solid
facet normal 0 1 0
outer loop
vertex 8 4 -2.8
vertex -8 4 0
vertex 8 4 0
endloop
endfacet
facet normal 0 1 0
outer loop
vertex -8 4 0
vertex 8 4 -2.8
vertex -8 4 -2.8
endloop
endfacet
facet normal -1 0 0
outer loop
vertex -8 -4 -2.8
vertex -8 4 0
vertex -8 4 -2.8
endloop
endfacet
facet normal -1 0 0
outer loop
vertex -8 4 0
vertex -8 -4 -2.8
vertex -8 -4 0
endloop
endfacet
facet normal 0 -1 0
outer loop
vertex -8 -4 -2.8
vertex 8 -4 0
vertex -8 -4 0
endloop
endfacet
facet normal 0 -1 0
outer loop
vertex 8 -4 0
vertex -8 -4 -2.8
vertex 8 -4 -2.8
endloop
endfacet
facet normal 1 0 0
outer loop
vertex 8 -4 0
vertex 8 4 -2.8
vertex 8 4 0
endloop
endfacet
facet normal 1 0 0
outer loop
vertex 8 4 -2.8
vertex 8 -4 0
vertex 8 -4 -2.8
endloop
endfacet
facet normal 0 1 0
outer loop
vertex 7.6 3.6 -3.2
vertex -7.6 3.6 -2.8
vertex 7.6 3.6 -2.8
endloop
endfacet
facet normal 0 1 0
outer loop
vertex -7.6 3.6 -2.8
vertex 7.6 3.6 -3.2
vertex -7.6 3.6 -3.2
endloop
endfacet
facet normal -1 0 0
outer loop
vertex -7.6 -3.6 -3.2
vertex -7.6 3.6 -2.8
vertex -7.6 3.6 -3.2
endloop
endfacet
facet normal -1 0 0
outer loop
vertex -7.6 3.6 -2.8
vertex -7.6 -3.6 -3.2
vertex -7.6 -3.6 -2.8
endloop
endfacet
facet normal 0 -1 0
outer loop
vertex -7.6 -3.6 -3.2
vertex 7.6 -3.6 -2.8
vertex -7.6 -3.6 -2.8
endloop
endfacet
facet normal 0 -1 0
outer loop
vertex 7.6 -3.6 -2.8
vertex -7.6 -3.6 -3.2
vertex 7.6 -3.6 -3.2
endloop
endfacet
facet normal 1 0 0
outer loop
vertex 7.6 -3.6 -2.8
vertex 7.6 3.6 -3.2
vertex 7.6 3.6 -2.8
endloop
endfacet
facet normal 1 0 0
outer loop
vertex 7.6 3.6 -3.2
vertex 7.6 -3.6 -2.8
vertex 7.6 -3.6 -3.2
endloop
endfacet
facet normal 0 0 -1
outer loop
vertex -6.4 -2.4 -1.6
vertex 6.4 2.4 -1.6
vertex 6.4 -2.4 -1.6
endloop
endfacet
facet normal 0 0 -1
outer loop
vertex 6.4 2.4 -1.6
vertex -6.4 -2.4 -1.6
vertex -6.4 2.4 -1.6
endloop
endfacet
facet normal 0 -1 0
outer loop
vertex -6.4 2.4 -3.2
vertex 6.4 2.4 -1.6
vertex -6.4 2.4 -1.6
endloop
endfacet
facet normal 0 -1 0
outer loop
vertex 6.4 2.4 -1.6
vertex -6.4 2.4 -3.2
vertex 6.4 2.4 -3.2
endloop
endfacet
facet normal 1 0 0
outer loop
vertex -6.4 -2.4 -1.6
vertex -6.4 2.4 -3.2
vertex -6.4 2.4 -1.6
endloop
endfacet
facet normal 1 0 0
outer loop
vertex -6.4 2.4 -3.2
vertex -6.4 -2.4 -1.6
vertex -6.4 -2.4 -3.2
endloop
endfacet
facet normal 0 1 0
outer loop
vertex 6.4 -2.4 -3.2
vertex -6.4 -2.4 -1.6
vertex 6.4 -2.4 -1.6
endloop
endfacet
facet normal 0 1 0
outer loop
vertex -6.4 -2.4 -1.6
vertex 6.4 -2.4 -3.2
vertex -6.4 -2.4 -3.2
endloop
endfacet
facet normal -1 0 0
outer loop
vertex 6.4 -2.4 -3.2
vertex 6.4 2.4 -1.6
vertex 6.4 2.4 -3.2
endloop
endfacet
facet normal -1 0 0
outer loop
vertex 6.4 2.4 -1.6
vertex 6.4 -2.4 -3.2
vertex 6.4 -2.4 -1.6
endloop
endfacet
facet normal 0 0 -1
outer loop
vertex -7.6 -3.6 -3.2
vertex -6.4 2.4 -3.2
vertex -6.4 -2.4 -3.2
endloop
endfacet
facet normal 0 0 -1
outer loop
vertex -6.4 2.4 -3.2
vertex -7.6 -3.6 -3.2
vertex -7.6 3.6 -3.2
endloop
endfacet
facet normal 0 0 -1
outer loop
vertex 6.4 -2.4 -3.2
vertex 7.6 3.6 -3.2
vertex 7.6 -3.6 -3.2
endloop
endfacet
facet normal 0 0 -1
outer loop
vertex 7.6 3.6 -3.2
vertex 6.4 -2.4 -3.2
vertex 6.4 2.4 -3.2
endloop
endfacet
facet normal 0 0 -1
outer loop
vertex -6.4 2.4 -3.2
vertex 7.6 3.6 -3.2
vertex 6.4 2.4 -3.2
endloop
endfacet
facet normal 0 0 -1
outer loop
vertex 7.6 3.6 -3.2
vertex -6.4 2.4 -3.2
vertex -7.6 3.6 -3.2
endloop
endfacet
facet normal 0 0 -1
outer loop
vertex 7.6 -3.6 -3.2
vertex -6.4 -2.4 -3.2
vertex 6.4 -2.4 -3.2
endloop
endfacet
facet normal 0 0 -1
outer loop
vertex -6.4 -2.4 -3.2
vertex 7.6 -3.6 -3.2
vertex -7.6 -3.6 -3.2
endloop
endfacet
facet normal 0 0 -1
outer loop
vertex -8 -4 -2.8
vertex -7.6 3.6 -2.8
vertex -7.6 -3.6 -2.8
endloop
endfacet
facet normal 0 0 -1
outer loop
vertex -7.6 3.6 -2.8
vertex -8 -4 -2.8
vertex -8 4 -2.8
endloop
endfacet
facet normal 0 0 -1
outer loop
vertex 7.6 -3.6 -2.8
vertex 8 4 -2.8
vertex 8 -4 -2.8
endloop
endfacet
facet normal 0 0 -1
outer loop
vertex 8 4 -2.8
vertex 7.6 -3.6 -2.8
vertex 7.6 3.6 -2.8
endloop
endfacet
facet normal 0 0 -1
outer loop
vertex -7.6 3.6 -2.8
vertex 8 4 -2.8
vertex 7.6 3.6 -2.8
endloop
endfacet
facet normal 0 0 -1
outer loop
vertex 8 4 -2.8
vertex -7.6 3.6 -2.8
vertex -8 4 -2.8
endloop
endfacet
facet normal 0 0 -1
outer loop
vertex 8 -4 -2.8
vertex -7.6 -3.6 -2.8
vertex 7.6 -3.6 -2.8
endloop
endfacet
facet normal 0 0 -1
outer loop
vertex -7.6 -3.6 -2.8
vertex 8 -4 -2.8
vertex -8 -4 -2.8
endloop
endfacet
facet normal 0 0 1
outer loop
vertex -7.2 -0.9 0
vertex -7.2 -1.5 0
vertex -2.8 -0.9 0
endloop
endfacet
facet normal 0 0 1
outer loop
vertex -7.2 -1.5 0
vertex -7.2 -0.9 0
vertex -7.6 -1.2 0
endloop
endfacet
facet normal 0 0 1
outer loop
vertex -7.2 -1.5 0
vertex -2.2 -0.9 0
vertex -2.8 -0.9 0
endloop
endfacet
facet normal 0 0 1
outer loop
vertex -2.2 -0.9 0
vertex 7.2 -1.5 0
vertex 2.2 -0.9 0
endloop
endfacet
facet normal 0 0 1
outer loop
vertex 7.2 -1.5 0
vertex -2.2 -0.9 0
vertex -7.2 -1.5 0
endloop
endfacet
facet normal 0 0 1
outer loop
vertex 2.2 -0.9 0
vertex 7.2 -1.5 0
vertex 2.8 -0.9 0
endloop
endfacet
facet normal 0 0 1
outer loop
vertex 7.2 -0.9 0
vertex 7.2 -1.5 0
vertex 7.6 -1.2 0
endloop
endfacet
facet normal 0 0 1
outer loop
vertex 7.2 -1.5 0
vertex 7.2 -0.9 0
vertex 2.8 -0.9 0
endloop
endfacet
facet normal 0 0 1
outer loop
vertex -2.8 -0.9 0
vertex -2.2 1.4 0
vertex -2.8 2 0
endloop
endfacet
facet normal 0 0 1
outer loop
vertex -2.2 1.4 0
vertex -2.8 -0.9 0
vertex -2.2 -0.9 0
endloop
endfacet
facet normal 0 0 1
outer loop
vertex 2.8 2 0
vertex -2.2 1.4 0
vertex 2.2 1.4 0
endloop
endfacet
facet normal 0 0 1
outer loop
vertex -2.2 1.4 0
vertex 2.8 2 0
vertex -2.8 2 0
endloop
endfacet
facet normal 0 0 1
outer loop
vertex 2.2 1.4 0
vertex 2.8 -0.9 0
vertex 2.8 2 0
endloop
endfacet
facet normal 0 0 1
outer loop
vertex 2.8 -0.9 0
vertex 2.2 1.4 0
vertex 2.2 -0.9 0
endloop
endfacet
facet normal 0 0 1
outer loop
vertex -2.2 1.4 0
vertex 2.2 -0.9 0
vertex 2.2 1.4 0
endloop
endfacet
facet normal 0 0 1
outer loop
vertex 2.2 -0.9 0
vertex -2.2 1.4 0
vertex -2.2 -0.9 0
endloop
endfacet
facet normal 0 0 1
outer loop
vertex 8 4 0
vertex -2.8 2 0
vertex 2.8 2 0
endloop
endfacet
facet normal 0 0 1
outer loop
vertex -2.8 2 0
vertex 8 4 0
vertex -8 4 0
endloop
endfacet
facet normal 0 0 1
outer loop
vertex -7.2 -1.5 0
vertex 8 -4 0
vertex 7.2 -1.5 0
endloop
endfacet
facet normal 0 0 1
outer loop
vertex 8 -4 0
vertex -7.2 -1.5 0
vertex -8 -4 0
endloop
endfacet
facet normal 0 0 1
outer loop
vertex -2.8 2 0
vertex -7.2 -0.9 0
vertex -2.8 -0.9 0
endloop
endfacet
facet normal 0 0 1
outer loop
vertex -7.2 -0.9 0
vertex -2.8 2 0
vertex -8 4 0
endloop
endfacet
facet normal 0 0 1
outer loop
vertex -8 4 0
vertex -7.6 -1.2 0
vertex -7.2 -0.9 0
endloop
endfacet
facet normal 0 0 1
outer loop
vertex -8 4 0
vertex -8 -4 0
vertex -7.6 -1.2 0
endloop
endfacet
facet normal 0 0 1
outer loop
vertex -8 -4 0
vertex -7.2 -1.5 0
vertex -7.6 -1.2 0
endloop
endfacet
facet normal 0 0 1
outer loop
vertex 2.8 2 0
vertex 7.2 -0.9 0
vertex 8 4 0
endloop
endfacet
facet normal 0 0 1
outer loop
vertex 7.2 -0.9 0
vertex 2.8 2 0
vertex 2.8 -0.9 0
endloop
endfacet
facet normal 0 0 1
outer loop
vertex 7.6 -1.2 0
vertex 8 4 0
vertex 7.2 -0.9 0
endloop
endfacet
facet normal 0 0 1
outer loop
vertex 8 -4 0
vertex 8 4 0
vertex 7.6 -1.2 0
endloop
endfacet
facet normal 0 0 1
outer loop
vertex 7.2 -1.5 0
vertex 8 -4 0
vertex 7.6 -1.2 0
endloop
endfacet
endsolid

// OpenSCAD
// file: ../p/box5.scad
use <../lib.scad>
function ldraw_lib__box5() = [
// 0 Box with 5 Faces and All Edges
// 0 Name: box5.dat
// 0 Author: James Jessiman
// 0 !LDRAW_ORG Primitive UPDATE 2012-01
// 0 !LICENSE Licensed under CC BY 2.0 and CC BY 4.0 : see CAreadme.txt
// 
// 0 BFC CERTIFY CCW
  [0,"BFC","CERTIFY"],
  [0,"BFC","CCW"],
// 
// 0 !HISTORY 2002-04-03 [sbliss] Modified for BFC compliance
// 0 !HISTORY 2002-04-25 [PTadmin] Official Update 2002-02
// 0 !HISTORY 2007-06-24 [PTadmin] Header formatted for Contributor Agreement
// 0 !HISTORY 2008-07-01 [PTadmin] Official Update 2008-01
// 0 !HISTORY 2012-02-16 [Philo] Changed to CCW
// 0 !HISTORY 2012-03-30 [PTadmin] Official Update 2012-01
// 
// 
// 2 24 1 1 1 -1 1 1
  [2,24,1,1,1,-1,1,1],
// 2 24 -1 1 1 -1 1 -1
  [2,24,-1,1,1,-1,1,-1],
// 2 24 -1 1 -1 1 1 -1
  [2,24,-1,1,-1,1,1,-1],
// 2 24 1 1 -1 1 1 1
  [2,24,1,1,-1,1,1,1],
// 2 24 1 0 1 -1 0 1
  [2,24,1,0,1,-1,0,1],
// 2 24 -1 0 1 -1 0 -1
  [2,24,-1,0,1,-1,0,-1],
// 2 24 -1 0 -1 1 0 -1
  [2,24,-1,0,-1,1,0,-1],
// 2 24 1 0 -1 1 0 1
  [2,24,1,0,-1,1,0,1],
// 2 24 1 0 1 1 1 1
  [2,24,1,0,1,1,1,1],
// 2 24 -1 0 1 -1 1 1
  [2,24,-1,0,1,-1,1,1],
// 2 24 1 0 -1 1 1 -1
  [2,24,1,0,-1,1,1,-1],
// 2 24 -1 0 -1 -1 1 -1
  [2,24,-1,0,-1,-1,1,-1],
// 4 16 -1 1 1 1 1 1 1 1 -1 -1 1 -1
  [4,16,-1,1,1,1,1,1,1,1,-1,-1,1,-1],
// 4 16 -1 1 1 -1 0 1 1 0 1 1 1 1
  [4,16,-1,1,1,-1,0,1,1,0,1,1,1,1],
// 4 16 -1 1 -1 -1 0 -1 -1 0 1 -1 1 1
  [4,16,-1,1,-1,-1,0,-1,-1,0,1,-1,1,1],
// 4 16 1 1 -1 1 0 -1 -1 0 -1 -1 1 -1
  [4,16,1,1,-1,1,0,-1,-1,0,-1,-1,1,-1],
// 4 16 1 1 1 1 0 1 1 0 -1 1 1 -1
  [4,16,1,1,1,1,0,1,1,0,-1,1,1,-1],
];
makepoly(ldraw_lib__box5(), line=0.2);
// file: ../p/box4.scad
use <../lib.scad>
function ldraw_lib__box4() = [
// 0 Box with 4 Faces (2 Parallel Pairs) and All Edges
// 0 Name: box4.dat
// 0 Author: James Jessiman
// 0 !LDRAW_ORG Primitive UPDATE 2012-01
// 0 !LICENSE Licensed under CC BY 2.0 and CC BY 4.0 : see CAreadme.txt
// 
// 0 BFC CERTIFY CCW
  [0,"BFC","CERTIFY"],
  [0,"BFC","CCW"],
// 
// 0 !HISTORY 2002-04-03 [sbliss] Modified for BFC compliance
// 0 !HISTORY 2002-04-25 [PTadmin] Official Update 2002-02
// 0 !HISTORY 2007-06-24 [PTadmin] Header formatted for Contributor Agreement
// 0 !HISTORY 2008-07-01 [PTadmin] Official Update 2008-01
// 0 !HISTORY 2012-02-16 [Philo] Changed to CCW
// 0 !HISTORY 2012-03-30 [PTadmin] Official Update 2012-01
// 
// 
// 2 24 1 1 1 -1 1 1
  [2,24,1,1,1,-1,1,1],
// 2 24 -1 1 1 -1 1 -1
  [2,24,-1,1,1,-1,1,-1],
// 2 24 -1 1 -1 1 1 -1
  [2,24,-1,1,-1,1,1,-1],
// 2 24 1 1 -1 1 1 1
  [2,24,1,1,-1,1,1,1],
// 2 24 1 0 1 -1 0 1
  [2,24,1,0,1,-1,0,1],
// 2 24 -1 0 1 -1 0 -1
  [2,24,-1,0,1,-1,0,-1],
// 2 24 -1 0 -1 1 0 -1
  [2,24,-1,0,-1,1,0,-1],
// 2 24 1 0 -1 1 0 1
  [2,24,1,0,-1,1,0,1],
// 2 24 1 0 1 1 1 1
  [2,24,1,0,1,1,1,1],
// 2 24 -1 0 1 -1 1 1
  [2,24,-1,0,1,-1,1,1],
// 2 24 1 0 -1 1 1 -1
  [2,24,1,0,-1,1,1,-1],
// 2 24 -1 0 -1 -1 1 -1
  [2,24,-1,0,-1,-1,1,-1],
// 4 16 -1 1 1 -1 0 1 1 0 1 1 1 1
  [4,16,-1,1,1,-1,0,1,1,0,1,1,1,1],
// 4 16 -1 1 -1 -1 0 -1 -1 0 1 -1 1 1
  [4,16,-1,1,-1,-1,0,-1,-1,0,1,-1,1,1],
// 4 16 1 1 -1 1 0 -1 -1 0 -1 -1 1 -1
  [4,16,1,1,-1,1,0,-1,-1,0,-1,-1,1,-1],
// 4 16 1 1 1 1 0 1 1 0 -1 1 1 -1
  [4,16,1,1,1,1,0,1,1,0,-1,1,1,-1],
];
makepoly(ldraw_lib__box4(), line=0.2);
// file: s/3069bs01.scad
use <../../lib.scad>
use <../../p/box4.scad>
use <../../p/box5.scad>
function ldraw_lib__s__3069bs01() = [
// 0 ~Tile  1 x  2 with Groove without Top Face
// 0 Name: s\3069bs01.dat
// 0 Author: Santeri Piippo [arezey]
// 0 !LDRAW_ORG Subpart UPDATE 2010-02
// 0 !LICENSE Licensed under CC BY 2.0 and CC BY 4.0 : see CAreadme.txt
// 
// 0 BFC CERTIFY CCW
  [0,"BFC","CERTIFY"],
  [0,"BFC","CCW"],
// 
// 0 !HISTORY 2010-07-05 [PTadmin] Official Update 2010-02
// 
// 
// 1 16 0 0 0 20 0 0 0 7 0 0 0 10 box4.dat
  [1,16,0,0,0,20,0,0,0,7,0,0,0,10, ldraw_lib__box4()],
// 1 16 0 7 0 19 0 0 0 1 0 0 0 9 box4.dat
  [1,16,0,7,0,19,0,0,0,1,0,0,0,9, ldraw_lib__box4()],
// 0 BFC INVERTNEXT
  [0,"BFC","INVERTNEXT"],
// 1 16 0 8 0 16 0 0 0 -4 0 0 0 6 box5.dat
  [1,16,0,8,0,16,0,0,0,-4,0,0,0,6, ldraw_lib__box5()],
// 4 16 -19 8 9 -16 8 6 -16 8 -6 -19 8 -9
  [4,16,-19,8,9,-16,8,6,-16,8,-6,-19,8,-9],
// 4 16 19 8 -9 16 8 -6 16 8 6 19 8 9
  [4,16,19,8,-9,16,8,-6,16,8,6,19,8,9],
// 4 16 19 8 9 16 8 6 -16 8 6 -19 8 9
  [4,16,19,8,9,16,8,6,-16,8,6,-19,8,9],
// 4 16 -19 8 -9 -16 8 -6 16 8 -6 19 8 -9
  [4,16,-19,8,-9,-16,8,-6,16,8,-6,19,8,-9],
// 4 16 -20 7 10 -19 7 9 -19 7 -9 -20 7 -10
  [4,16,-20,7,10,-19,7,9,-19,7,-9,-20,7,-10],
// 4 16 20 7 -10 19 7 -9 19 7 9 20 7 10
  [4,16,20,7,-10,19,7,-9,19,7,9,20,7,10],
// 4 16 20 7 10 19 7 9 -19 7 9 -20 7 10
  [4,16,20,7,10,19,7,9,-19,7,9,-20,7,10],
// 4 16 -20 7 -10 -19 7 -9 19 7 -9 20 7 -10
  [4,16,-20,7,-10,-19,7,-9,19,7,-9,20,7,-10],
// 0 //
];
makepoly(ldraw_lib__s__3069bs01(), line=0.2);
// main file
use <../lib.scad>
use <s/3069bs01.scad>
function ldraw_lib__3069bpzd() = [
// 0 Tile  1 x  2 with Black Rectangle Outline and Line Pattern
// 0 Name: 3069bpzd.dat
// 0 Author: Vincent Messenet [Cheenzo]
// 0 !LDRAW_ORG Part UPDATE 2019-02
// 0 !LICENSE Licensed under CC BY 2.0 and CC BY 4.0 : see CAreadme.txt
// 
// 0 BFC CERTIFY CCW
  [0,"BFC","CERTIFY"],
  [0,"BFC","CCW"],
// 
// 0 !KEYWORDS Brickheadz, BrickLink 3069bpb650, Frozen, Olaf, Set 41618
// 
// 0 !HISTORY 2019-09-09 [PTadmin] Official Update 2019-02
// 
// 
// 1 16 0 0 0 1 0 0 0 1 0 0 0 1 s\3069bs01.dat
  [1,16,0,0,0,1,0,0,0,1,0,0,0,1, ldraw_lib__s__3069bs01()],
// 
// 4 0 -19 0 -3 -18 0 -3.75 -7 0 -2.25 -18 0 -2.25
  [4,0,-19,0,-3,-18,0,-3.75,-7,0,-2.25,-18,0,-2.25],
// 3 0 -18 0 -3.75 -5.5 0 -2.25 -7 0 -2.25
  [3,0,-18,0,-3.75,-5.5,0,-2.25,-7,0,-2.25],
// 4 0 -18 0 -3.75 18 0 -3.75 5.5 0 -2.25 -5.5 0 -2.25
  [4,0,-18,0,-3.75,18,0,-3.75,5.5,0,-2.25,-5.5,0,-2.25],
// 3 0 5.5 0 -2.25 18 0 -3.75 7 0 -2.25
  [3,0,5.5,0,-2.25,18,0,-3.75,7,0,-2.25],
// 4 0 7 0 -2.25 18 0 -3.75 19 0 -3 18 0 -2.25
  [4,0,7,0,-2.25,18,0,-3.75,19,0,-3,18,0,-2.25],
// 4 0 -7 0 5 -7 0 -2.25 -5.5 0 -2.25 -5.5 0 3.5
  [4,0,-7,0,5,-7,0,-2.25,-5.5,0,-2.25,-5.5,0,3.5],
// 4 0 -7 0 5 -5.5 0 3.5 5.5 0 3.5 7 0 5
  [4,0,-7,0,5,-5.5,0,3.5,5.5,0,3.5,7,0,5],
// 4 0 5.5 0 -2.25 7 0 -2.25 7 0 5 5.5 0 3.5
  [4,0,5.5,0,-2.25,7,0,-2.25,7,0,5,5.5,0,3.5],
// 
// 4 16 -5.5 0 3.5 -5.5 0 -2.25 5.5 0 -2.25 5.5 0 3.5
  [4,16,-5.5,0,3.5,-5.5,0,-2.25,5.5,0,-2.25,5.5,0,3.5],
// 4 16 -20 0 10 -7 0 5 7 0 5 20 0 10
  [4,16,-20,0,10,-7,0,5,7,0,5,20,0,10],
// 4 16 -20 0 -10 20 0 -10 18 0 -3.75 -18 0 -3.75
  [4,16,-20,0,-10,20,0,-10,18,0,-3.75,-18,0,-3.75],
// 4 16 -20 0 10 -18 0 -2.25 -7 0 -2.25 -7 0 5
  [4,16,-20,0,10,-18,0,-2.25,-7,0,-2.25,-7,0,5],
// 3 16 -20 0 10 -19 0 -3 -18 0 -2.25
  [3,16,-20,0,10,-19,0,-3,-18,0,-2.25],
// 3 16 -20 0 10 -20 0 -10 -19 0 -3
  [3,16,-20,0,10,-20,0,-10,-19,0,-3],
// 3 16 -20 0 -10 -18 0 -3.75 -19 0 -3
  [3,16,-20,0,-10,-18,0,-3.75,-19,0,-3],
// 4 16 7 0 -2.25 18 0 -2.25 20 0 10 7 0 5
  [4,16,7,0,-2.25,18,0,-2.25,20,0,10,7,0,5],
// 3 16 19 0 -3 20 0 10 18 0 -2.25
  [3,16,19,0,-3,20,0,10,18,0,-2.25],
// 3 16 20 0 -10 20 0 10 19 0 -3
  [3,16,20,0,-10,20,0,10,19,0,-3],
// 3 16 18 0 -3.75 20 0 -10 19 0 -3
  [3,16,18,0,-3.75,20,0,-10,19,0,-3],
];
makepoly(ldraw_lib__3069bpzd(), line=0.2);
